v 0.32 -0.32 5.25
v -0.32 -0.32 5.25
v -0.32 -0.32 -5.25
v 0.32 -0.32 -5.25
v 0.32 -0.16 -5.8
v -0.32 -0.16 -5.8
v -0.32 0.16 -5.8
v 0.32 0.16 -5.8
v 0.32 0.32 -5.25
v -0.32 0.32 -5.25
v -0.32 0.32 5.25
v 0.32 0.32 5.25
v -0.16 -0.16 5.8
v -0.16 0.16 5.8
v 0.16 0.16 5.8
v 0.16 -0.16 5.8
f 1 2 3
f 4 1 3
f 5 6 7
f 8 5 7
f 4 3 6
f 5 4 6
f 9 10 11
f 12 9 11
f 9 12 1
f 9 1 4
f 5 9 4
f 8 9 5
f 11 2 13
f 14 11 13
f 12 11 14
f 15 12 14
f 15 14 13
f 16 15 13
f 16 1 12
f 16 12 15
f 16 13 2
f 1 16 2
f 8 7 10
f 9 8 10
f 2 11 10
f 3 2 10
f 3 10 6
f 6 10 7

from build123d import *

# Parameters (mm, degrees)
EXTRUDE_1_DEPTH      = 0.32
EXTRUDE_1_DEPTH_BACK = 0.32
CUT_EXTRUDE_2_DEPTH  = 6.843971252


with BuildPart() as part:
    # Эскиз1 → Бобышка-Вытянуть1 (new, two sides: drawn at the far end of the back side and taken through both)
    with BuildSketch(Plane(origin=(0, 0, 0), x_dir=(0, 0, -1), z_dir=(1, 0, 0)).offset(-EXTRUDE_1_DEPTH_BACK)):
        Polygon((-5.25, -0.32), (5.25, -0.32), (5.8, -0.16), (5.8, 0.16), (5.25, 0.32), (-5.25, 0.32), (-5.8, 0.16), (-5.8, -0.16), align=None)
    extrude(amount=EXTRUDE_1_DEPTH + EXTRUDE_1_DEPTH_BACK)

    # Эскиз4 → Вырез-Вытянуть2 (cut, through all)
    with BuildSketch(Plane.XZ.offset(0.32)):
        Polygon((-0.32, 5.25), (-0.16, 5.8), (-0.32, 5.8), align=None)
    cut_extrude_2 = extrude(amount=-CUT_EXTRUDE_2_DEPTH, mode=Mode.SUBTRACT)

    # Зеркальное отражение1: Вырез-Вытянуть2 across plane
    add(cut_extrude_2.mirror(Plane(origin=(0, 0, 0), x_dir=(0, 0, 1), z_dir=(1, 0, 0))), mode=Mode.SUBTRACT)


solid = part.part
